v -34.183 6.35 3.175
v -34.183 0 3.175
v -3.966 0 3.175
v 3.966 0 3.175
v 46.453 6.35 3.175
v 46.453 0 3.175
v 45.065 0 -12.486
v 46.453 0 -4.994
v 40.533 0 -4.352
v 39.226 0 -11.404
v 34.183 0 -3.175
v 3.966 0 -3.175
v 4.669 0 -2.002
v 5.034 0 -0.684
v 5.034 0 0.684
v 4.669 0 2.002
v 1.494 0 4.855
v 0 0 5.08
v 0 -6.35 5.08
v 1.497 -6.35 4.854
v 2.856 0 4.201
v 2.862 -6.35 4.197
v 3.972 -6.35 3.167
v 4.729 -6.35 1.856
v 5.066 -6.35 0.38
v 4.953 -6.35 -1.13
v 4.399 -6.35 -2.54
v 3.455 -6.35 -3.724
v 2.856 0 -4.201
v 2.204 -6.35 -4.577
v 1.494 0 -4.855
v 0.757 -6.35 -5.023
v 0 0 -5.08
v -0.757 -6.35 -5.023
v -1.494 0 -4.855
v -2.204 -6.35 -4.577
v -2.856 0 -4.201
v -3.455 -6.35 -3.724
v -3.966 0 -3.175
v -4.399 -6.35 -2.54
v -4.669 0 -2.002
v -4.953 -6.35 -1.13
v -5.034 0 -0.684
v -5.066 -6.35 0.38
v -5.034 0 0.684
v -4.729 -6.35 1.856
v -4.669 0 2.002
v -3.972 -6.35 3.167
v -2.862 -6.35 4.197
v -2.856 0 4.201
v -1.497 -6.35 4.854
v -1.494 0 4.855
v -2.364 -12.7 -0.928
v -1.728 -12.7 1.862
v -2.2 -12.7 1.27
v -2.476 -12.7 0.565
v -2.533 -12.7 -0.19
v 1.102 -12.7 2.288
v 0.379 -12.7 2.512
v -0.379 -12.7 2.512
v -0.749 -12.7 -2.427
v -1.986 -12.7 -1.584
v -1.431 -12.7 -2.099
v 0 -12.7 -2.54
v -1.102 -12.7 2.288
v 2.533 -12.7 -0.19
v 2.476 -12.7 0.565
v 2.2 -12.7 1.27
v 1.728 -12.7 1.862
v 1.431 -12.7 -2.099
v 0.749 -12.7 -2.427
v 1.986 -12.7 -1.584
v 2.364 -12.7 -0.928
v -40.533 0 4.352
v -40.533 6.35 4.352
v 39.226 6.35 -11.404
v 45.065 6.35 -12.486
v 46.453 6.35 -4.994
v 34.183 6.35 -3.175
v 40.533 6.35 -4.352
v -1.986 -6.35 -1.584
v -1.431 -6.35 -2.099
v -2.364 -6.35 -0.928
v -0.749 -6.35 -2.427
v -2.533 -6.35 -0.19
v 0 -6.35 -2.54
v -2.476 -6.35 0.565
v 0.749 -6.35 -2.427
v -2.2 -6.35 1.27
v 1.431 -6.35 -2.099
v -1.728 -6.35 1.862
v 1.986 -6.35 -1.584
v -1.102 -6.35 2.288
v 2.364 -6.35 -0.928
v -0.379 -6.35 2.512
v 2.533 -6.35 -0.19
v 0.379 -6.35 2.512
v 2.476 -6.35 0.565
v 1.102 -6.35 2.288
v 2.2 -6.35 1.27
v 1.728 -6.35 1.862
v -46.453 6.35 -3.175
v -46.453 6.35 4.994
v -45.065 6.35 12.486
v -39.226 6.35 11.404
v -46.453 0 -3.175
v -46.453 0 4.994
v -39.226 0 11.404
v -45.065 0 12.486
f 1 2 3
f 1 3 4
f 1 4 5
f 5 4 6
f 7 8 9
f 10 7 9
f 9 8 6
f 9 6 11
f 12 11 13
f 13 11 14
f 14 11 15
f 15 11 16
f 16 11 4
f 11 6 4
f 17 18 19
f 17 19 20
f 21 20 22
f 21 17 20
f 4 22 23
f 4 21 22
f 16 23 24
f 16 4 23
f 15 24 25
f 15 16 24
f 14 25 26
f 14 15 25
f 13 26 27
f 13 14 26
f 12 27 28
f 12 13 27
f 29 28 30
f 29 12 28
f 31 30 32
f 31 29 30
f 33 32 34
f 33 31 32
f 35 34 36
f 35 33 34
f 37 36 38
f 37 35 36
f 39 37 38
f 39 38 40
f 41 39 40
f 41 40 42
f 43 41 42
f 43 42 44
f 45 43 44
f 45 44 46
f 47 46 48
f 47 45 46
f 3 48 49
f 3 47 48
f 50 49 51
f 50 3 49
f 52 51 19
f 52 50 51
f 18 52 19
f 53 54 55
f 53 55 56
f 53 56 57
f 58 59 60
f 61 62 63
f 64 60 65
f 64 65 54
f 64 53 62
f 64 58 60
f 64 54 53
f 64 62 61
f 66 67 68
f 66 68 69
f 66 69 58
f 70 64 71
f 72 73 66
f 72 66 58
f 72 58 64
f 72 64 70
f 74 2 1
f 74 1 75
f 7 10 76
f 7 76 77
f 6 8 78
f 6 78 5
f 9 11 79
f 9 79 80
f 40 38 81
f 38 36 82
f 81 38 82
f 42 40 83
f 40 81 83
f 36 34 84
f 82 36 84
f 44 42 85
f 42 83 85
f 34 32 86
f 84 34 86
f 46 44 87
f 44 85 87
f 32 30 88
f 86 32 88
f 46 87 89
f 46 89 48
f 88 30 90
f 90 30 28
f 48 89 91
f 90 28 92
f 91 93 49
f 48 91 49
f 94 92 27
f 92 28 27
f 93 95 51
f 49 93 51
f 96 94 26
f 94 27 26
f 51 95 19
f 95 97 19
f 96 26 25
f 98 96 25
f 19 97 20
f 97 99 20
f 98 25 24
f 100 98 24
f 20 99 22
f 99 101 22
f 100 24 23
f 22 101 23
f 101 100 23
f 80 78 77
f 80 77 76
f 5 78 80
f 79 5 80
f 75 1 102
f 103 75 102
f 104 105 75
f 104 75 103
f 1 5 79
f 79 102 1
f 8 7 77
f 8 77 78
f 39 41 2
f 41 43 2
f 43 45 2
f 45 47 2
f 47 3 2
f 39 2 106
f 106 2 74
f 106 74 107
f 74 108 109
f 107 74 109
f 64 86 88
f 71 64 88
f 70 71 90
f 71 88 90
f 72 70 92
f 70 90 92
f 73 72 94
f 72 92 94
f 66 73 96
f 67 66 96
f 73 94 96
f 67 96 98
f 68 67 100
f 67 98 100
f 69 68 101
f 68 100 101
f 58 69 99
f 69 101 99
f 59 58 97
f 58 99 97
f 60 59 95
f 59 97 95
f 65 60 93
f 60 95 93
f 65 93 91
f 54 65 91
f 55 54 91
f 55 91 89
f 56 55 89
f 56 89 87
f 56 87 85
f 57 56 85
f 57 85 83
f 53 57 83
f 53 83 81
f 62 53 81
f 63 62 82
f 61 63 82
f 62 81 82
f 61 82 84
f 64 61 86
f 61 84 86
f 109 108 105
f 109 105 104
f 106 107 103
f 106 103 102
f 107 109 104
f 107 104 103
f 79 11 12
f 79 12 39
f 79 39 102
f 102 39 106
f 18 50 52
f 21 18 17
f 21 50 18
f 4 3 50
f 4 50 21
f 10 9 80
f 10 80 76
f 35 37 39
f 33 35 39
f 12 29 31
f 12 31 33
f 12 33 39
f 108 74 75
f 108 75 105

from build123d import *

# Parameters (mm, degrees)
BOSS_EXTRUDE2_DEPTH = 6.35
CIRPATTERN8_COUNT   = 2
SKETCH17_R          = 5.08
BOSS_EXTRUDE3_DEPTH = 6.35
SKETCH18_R          = 2.54
BOSS_EXTRUDE4_DEPTH = 6.35


with BuildPart() as part:
    # Sketch16 → Boss-Extrude2 (new body)
    with BuildSketch(Plane(origin=(0, 0, 0), x_dir=(1, 0, 0), z_dir=(0, 1, 0))):
        Polygon((0, 3.175), (0, -3.175), (46.453207734, -3.175), (46.453207734, 4.99354435), (45.06457303, 12.485946745), (39.226311646, 11.403888956), (40.53332, 4.351902935), (34.18332, 3.175), align=None)
    boss_extrude2 = extrude(amount=BOSS_EXTRUDE2_DEPTH)

    # CirPattern8: Boss-Extrude2 ×2 about axis
    cirpattern8_axis = Axis((0, 11.461697207, 0), (0, -1, 0))
    for i in range(1, CIRPATTERN8_COUNT):
        add(boss_extrude2.rotate(cirpattern8_axis, i * 360 / CIRPATTERN8_COUNT))

    # Sketch17 → Boss-Extrude3 (add)
    with BuildSketch(Plane(origin=(0, 0, 0), x_dir=(1, 0, 0), z_dir=(0, 1, 0))):
        Circle(SKETCH17_R)
    extrude(amount=-BOSS_EXTRUDE3_DEPTH)

    # Sketch18 → Boss-Extrude4 (add)
    with BuildSketch(Plane.XZ.offset(6.35)):
        Circle(SKETCH18_R)
    extrude(amount=BOSS_EXTRUDE4_DEPTH)


solid = part.part
